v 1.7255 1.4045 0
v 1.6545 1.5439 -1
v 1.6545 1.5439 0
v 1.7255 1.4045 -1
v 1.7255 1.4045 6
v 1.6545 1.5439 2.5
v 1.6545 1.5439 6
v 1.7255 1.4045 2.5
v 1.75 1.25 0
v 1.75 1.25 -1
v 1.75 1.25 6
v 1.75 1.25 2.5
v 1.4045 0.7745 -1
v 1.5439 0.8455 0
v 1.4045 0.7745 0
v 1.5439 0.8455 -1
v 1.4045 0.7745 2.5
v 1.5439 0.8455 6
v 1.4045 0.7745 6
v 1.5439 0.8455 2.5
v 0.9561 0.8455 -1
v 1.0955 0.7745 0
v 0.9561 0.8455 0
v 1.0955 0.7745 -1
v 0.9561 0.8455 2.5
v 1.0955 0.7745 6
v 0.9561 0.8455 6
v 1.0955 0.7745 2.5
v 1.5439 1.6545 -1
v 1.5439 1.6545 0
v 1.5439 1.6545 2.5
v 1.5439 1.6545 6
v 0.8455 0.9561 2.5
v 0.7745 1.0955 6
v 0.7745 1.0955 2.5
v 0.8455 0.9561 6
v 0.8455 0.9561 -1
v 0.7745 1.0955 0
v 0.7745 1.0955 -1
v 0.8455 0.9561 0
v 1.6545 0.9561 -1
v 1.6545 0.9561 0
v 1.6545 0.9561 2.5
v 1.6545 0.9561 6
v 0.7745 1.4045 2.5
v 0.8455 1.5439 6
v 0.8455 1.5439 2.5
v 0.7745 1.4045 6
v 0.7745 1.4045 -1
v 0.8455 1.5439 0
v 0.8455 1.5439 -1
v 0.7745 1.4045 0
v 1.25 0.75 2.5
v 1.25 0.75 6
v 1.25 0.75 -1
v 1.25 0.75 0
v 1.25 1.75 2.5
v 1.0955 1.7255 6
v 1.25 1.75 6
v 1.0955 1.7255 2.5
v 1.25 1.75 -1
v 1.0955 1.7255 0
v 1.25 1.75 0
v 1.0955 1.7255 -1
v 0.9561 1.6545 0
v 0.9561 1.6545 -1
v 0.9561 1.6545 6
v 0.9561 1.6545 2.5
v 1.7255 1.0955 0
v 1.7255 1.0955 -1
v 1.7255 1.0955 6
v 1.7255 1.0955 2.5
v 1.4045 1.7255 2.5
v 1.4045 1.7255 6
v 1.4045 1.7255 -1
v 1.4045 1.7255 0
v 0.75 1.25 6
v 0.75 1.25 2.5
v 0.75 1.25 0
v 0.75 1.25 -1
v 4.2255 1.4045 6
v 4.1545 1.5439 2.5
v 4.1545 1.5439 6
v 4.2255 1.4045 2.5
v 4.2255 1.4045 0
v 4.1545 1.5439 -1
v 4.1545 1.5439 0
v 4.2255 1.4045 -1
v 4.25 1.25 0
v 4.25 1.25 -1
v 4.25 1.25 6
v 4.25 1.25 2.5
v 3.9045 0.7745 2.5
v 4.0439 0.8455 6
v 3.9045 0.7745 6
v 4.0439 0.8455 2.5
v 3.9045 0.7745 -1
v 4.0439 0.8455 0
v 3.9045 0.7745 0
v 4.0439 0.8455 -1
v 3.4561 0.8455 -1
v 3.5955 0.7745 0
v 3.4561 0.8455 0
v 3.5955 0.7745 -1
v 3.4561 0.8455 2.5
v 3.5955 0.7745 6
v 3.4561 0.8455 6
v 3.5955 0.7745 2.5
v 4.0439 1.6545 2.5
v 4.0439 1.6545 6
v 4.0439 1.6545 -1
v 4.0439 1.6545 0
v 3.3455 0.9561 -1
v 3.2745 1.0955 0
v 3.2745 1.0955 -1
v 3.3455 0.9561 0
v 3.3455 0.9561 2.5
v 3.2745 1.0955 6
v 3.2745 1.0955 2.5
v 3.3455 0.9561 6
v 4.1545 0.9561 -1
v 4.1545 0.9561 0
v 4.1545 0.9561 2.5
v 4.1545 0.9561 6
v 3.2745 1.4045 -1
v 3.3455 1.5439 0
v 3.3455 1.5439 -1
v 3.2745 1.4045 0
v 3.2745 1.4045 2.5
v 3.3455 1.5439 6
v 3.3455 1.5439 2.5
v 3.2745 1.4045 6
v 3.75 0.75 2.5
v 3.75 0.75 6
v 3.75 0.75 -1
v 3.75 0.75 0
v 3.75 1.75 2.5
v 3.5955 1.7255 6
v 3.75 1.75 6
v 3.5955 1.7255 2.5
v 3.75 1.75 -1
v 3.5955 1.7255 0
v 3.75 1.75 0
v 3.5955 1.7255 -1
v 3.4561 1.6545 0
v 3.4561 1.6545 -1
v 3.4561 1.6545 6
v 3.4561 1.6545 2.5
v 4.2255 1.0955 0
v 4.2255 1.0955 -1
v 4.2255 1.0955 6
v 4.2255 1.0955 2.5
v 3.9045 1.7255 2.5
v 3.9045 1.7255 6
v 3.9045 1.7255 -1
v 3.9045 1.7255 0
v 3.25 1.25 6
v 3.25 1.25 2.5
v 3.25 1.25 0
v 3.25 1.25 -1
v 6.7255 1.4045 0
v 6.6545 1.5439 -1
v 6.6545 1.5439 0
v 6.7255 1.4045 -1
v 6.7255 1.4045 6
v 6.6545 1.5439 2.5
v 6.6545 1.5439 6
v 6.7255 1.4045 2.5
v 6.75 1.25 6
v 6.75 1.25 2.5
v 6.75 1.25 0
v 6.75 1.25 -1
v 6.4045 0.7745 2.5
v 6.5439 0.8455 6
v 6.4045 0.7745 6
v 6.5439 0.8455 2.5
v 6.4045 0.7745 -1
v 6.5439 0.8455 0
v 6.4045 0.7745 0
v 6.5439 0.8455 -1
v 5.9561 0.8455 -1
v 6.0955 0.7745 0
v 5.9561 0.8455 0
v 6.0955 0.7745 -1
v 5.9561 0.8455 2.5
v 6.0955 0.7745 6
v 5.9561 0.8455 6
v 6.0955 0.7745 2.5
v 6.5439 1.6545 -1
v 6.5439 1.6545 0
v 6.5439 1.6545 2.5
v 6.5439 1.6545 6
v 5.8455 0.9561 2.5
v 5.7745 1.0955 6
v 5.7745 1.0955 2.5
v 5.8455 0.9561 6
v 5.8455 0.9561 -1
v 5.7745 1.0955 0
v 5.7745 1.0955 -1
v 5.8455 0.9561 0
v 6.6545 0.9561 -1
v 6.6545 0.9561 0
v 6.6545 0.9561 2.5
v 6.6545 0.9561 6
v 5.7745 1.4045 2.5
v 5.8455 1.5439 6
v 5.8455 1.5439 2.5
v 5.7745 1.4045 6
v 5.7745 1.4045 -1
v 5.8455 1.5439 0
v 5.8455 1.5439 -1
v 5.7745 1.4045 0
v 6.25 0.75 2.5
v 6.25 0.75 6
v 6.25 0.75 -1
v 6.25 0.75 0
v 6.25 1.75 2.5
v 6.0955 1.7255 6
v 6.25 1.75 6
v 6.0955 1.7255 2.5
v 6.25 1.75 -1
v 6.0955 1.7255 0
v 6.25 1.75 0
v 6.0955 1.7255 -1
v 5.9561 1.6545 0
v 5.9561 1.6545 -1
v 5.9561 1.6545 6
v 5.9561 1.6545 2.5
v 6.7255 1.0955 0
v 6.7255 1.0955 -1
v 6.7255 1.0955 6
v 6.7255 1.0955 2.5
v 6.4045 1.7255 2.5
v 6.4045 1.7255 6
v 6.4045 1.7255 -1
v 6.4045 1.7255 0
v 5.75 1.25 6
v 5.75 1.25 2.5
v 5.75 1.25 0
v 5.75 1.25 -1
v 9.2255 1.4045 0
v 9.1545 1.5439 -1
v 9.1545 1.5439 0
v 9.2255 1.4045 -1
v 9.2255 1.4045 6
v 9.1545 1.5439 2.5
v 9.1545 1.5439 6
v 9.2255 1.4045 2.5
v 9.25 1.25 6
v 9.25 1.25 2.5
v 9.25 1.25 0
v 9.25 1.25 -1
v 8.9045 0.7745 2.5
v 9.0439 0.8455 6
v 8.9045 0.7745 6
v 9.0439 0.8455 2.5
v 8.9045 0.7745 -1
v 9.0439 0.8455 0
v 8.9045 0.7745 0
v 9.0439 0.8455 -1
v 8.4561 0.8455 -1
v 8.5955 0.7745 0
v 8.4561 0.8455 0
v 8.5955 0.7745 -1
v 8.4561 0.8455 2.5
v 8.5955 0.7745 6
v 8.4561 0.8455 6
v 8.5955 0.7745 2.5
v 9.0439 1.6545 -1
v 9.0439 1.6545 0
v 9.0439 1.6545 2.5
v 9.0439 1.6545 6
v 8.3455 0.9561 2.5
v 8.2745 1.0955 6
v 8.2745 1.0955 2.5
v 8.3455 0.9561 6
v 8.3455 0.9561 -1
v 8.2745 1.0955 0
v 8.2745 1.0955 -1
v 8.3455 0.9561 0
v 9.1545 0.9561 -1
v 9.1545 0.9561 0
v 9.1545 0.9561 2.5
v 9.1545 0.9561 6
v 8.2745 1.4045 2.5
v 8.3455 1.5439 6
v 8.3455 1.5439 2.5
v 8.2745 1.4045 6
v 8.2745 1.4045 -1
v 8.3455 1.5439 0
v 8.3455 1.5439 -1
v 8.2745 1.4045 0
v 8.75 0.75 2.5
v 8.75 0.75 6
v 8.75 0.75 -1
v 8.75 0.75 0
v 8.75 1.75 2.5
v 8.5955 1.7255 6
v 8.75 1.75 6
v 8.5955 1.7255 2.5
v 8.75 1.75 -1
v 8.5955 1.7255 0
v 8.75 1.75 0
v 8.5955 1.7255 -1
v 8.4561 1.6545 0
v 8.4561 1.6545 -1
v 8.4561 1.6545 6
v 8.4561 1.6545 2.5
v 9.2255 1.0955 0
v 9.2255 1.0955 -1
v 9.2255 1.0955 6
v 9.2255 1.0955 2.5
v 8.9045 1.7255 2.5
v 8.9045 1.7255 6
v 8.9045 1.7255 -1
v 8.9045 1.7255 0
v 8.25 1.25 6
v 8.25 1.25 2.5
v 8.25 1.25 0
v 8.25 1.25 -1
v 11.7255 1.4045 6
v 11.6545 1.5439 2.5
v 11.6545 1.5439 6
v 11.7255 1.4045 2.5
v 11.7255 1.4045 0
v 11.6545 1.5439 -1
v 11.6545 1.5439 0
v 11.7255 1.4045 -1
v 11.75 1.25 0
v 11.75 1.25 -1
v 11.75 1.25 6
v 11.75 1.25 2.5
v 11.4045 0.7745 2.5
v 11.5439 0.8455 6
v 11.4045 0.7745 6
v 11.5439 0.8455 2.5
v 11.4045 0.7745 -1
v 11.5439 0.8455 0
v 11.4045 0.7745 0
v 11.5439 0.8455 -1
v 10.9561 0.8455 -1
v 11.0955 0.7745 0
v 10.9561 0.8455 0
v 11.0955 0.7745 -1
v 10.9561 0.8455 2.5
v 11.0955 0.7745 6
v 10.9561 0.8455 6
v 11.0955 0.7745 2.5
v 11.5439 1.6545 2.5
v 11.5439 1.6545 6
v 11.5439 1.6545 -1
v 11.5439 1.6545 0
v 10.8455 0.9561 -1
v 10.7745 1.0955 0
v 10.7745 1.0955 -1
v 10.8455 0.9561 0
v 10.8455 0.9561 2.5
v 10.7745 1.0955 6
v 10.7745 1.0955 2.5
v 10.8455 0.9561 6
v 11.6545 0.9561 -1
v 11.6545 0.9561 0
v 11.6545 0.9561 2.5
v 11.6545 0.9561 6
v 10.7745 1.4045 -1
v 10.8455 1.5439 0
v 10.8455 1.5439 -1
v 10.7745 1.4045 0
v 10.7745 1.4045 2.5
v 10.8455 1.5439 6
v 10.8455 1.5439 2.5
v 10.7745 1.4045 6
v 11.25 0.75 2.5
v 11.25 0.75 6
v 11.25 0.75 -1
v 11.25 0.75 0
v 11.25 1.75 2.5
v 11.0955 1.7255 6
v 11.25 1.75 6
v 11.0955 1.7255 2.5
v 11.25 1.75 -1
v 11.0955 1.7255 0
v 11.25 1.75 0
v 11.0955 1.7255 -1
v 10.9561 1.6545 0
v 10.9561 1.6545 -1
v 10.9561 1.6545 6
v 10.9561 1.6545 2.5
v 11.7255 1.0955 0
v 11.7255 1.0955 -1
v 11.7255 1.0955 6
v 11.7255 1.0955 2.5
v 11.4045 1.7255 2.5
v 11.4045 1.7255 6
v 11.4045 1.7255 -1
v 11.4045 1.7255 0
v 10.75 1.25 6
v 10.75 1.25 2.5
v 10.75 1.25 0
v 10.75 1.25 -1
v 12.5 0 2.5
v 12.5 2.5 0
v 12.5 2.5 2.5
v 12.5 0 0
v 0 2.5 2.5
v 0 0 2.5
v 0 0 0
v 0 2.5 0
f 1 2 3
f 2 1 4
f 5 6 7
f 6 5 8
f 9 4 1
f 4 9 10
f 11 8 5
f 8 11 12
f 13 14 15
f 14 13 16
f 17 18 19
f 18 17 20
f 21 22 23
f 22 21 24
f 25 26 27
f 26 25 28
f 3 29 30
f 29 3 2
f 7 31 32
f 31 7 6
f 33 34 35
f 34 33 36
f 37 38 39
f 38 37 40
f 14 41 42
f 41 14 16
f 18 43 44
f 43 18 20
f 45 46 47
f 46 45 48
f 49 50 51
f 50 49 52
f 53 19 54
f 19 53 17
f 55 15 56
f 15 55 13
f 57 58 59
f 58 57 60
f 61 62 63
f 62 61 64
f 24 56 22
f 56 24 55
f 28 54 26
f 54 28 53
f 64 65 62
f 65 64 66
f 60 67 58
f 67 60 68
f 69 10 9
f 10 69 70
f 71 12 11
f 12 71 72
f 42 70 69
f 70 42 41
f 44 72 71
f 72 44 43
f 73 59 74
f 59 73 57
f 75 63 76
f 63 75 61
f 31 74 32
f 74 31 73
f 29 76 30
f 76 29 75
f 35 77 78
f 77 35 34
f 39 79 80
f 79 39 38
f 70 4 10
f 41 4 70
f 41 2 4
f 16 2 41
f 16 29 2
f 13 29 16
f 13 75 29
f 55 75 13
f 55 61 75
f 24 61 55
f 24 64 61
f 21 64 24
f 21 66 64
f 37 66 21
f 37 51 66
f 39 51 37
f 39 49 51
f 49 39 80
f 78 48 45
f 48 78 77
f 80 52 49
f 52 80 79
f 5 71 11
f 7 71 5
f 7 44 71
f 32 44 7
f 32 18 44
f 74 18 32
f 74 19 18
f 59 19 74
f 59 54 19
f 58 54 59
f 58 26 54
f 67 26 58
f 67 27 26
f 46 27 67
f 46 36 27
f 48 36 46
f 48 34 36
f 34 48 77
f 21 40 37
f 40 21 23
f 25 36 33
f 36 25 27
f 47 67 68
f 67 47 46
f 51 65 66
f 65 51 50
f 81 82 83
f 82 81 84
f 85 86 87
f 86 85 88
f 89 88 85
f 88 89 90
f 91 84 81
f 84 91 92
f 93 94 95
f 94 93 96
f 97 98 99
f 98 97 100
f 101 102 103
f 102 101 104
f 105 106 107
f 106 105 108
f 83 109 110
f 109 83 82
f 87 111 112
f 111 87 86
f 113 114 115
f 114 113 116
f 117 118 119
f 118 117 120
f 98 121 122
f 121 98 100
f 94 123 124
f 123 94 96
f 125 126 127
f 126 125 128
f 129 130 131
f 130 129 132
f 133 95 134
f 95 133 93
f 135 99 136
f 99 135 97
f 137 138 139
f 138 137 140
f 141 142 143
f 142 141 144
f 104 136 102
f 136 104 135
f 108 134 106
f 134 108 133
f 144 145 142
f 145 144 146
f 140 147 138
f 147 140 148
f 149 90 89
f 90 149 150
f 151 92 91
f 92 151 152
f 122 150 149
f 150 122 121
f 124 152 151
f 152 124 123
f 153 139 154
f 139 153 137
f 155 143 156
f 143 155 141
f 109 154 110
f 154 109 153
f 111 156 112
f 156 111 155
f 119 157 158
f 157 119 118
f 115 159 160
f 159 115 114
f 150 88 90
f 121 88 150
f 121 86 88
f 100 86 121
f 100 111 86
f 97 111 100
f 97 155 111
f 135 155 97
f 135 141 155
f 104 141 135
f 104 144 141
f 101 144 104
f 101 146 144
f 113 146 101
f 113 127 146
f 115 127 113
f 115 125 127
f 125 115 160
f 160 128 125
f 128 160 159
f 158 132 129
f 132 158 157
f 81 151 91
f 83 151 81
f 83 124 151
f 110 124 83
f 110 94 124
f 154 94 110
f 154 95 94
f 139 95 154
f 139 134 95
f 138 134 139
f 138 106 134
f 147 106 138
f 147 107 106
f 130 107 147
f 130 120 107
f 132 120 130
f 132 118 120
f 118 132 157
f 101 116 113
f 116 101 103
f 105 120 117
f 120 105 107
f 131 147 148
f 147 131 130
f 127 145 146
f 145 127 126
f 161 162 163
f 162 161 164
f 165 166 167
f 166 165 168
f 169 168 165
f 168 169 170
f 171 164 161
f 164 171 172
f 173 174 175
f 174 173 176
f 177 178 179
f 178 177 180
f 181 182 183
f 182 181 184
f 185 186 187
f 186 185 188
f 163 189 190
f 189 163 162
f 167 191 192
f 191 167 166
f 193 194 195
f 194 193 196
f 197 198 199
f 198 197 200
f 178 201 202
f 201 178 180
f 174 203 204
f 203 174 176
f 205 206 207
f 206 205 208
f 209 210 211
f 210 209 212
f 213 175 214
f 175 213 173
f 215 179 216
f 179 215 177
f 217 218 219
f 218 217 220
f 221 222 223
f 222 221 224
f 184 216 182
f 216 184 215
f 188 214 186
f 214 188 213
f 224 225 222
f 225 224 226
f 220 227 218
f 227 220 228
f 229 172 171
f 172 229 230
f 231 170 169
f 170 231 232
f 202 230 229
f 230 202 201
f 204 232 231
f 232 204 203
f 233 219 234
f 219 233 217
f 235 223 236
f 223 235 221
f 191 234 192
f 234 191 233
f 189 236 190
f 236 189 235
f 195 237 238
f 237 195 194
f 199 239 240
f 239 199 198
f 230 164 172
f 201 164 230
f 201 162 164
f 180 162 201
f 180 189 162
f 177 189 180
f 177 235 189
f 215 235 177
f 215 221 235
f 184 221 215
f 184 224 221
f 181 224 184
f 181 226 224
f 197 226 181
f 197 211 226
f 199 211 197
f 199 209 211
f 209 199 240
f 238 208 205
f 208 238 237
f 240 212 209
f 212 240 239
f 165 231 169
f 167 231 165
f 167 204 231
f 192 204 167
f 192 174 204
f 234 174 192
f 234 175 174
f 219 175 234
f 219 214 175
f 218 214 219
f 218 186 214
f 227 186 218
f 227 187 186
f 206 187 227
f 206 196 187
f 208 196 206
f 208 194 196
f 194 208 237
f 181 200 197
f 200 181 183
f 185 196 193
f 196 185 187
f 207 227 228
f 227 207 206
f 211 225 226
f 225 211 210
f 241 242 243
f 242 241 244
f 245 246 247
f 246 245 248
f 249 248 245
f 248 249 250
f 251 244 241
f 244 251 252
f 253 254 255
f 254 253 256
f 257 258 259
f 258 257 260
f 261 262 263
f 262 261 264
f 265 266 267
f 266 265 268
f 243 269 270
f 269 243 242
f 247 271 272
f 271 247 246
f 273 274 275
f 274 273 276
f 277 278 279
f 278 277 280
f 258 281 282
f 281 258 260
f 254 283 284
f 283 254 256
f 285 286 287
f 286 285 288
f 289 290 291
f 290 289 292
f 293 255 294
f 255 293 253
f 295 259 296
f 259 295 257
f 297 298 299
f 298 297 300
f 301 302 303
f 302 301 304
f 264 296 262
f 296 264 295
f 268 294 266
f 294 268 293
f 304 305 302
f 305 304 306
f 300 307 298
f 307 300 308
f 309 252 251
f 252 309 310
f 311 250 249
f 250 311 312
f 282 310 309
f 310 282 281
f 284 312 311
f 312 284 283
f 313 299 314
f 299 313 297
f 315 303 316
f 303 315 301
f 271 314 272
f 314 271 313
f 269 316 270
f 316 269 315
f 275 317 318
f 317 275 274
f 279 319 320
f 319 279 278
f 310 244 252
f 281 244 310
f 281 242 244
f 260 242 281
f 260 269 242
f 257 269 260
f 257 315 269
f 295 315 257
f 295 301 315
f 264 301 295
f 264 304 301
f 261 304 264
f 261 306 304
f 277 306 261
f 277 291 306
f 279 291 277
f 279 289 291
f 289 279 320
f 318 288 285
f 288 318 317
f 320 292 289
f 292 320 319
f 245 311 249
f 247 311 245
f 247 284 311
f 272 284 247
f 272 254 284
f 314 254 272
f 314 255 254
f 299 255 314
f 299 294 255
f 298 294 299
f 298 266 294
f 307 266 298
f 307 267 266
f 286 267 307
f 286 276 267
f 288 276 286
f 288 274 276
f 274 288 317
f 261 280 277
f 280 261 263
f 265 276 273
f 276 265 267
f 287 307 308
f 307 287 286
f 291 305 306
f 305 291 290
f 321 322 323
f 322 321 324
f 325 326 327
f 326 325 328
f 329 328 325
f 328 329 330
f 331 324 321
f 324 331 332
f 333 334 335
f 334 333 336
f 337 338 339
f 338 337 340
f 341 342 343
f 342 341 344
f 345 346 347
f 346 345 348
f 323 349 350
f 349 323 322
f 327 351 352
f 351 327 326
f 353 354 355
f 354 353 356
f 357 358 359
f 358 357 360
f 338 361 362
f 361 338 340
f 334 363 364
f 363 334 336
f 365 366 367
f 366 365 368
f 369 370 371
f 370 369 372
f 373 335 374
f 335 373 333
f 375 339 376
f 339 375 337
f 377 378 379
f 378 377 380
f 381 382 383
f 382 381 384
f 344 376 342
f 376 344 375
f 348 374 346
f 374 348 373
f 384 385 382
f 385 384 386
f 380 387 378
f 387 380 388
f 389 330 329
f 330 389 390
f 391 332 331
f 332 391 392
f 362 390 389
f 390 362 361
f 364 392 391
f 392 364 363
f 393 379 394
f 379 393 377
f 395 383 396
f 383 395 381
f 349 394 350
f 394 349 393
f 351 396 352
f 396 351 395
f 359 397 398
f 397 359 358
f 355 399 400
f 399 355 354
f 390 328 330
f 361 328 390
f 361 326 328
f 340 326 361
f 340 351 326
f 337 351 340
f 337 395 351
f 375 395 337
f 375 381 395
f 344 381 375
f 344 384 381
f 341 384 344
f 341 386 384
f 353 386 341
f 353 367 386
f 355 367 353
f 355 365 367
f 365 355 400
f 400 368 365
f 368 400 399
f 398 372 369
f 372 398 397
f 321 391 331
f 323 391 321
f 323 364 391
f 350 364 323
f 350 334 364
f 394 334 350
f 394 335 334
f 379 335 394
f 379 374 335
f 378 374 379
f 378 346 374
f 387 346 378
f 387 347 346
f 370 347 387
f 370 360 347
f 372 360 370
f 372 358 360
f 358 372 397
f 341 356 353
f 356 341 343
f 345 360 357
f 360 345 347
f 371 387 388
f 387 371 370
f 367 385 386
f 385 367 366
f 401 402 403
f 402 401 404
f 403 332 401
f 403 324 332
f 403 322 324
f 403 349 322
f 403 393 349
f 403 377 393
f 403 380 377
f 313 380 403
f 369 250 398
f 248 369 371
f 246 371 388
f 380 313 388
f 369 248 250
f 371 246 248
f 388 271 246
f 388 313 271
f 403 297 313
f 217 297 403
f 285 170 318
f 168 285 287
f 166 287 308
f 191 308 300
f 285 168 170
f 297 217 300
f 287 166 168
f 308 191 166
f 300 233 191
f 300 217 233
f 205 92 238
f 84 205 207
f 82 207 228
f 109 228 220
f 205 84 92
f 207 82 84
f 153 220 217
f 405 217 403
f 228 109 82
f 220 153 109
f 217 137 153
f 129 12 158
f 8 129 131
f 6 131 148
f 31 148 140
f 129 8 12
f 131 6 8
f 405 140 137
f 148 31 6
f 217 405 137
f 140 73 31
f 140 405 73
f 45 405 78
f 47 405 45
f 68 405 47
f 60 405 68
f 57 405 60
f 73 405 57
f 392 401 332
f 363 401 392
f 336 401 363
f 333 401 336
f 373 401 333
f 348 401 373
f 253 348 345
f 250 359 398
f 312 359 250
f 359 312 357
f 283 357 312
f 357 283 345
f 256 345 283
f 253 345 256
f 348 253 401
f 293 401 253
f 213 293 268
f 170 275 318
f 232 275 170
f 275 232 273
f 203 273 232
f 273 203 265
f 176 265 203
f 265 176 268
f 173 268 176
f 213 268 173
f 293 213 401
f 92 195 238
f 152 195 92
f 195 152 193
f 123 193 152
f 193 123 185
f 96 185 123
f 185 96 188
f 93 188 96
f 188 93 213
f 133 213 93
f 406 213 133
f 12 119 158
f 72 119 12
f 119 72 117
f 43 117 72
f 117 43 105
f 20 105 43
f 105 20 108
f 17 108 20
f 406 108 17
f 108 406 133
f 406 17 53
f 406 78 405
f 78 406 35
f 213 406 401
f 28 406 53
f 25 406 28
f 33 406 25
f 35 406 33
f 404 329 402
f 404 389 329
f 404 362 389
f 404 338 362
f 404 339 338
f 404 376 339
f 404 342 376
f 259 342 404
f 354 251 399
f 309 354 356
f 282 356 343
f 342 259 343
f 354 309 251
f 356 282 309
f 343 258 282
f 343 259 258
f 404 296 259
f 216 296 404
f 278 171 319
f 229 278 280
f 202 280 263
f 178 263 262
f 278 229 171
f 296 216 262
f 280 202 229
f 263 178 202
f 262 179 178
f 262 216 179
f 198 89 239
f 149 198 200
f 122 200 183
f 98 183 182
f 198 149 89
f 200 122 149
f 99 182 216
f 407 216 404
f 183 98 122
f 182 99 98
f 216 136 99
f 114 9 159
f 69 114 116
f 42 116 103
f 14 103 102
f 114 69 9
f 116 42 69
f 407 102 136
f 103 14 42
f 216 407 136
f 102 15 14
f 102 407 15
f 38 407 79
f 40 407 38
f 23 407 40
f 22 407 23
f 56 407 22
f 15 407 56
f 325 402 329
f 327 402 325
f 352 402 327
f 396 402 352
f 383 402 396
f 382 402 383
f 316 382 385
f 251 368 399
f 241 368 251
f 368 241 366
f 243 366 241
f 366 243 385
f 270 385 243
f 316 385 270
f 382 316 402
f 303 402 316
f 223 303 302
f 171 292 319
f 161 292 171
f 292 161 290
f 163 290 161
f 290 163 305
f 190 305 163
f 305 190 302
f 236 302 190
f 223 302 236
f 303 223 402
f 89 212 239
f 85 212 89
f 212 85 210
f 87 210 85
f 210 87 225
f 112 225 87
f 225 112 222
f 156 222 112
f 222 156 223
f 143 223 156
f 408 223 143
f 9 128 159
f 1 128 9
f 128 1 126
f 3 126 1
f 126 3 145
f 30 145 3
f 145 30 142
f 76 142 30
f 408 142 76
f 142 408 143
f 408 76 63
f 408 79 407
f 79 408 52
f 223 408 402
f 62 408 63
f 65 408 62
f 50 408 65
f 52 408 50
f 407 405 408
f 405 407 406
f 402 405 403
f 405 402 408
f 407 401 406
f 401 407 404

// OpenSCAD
module maleHeader(pins=40,pinLength=11.2,rotation=0){
    length=2.5 * pins;
    color("Black") cube([length,2.5,2.5]);  //plastic base
    for (i=[0:pins-1]){ //pins
        translate([1.25+2.5*i,1.25,2.5]) color("white") cylinder(r=0.5,h=pinLength,center=true,$fn=20);
    }
}
maleHeader(pins=5,pinLength=7);
